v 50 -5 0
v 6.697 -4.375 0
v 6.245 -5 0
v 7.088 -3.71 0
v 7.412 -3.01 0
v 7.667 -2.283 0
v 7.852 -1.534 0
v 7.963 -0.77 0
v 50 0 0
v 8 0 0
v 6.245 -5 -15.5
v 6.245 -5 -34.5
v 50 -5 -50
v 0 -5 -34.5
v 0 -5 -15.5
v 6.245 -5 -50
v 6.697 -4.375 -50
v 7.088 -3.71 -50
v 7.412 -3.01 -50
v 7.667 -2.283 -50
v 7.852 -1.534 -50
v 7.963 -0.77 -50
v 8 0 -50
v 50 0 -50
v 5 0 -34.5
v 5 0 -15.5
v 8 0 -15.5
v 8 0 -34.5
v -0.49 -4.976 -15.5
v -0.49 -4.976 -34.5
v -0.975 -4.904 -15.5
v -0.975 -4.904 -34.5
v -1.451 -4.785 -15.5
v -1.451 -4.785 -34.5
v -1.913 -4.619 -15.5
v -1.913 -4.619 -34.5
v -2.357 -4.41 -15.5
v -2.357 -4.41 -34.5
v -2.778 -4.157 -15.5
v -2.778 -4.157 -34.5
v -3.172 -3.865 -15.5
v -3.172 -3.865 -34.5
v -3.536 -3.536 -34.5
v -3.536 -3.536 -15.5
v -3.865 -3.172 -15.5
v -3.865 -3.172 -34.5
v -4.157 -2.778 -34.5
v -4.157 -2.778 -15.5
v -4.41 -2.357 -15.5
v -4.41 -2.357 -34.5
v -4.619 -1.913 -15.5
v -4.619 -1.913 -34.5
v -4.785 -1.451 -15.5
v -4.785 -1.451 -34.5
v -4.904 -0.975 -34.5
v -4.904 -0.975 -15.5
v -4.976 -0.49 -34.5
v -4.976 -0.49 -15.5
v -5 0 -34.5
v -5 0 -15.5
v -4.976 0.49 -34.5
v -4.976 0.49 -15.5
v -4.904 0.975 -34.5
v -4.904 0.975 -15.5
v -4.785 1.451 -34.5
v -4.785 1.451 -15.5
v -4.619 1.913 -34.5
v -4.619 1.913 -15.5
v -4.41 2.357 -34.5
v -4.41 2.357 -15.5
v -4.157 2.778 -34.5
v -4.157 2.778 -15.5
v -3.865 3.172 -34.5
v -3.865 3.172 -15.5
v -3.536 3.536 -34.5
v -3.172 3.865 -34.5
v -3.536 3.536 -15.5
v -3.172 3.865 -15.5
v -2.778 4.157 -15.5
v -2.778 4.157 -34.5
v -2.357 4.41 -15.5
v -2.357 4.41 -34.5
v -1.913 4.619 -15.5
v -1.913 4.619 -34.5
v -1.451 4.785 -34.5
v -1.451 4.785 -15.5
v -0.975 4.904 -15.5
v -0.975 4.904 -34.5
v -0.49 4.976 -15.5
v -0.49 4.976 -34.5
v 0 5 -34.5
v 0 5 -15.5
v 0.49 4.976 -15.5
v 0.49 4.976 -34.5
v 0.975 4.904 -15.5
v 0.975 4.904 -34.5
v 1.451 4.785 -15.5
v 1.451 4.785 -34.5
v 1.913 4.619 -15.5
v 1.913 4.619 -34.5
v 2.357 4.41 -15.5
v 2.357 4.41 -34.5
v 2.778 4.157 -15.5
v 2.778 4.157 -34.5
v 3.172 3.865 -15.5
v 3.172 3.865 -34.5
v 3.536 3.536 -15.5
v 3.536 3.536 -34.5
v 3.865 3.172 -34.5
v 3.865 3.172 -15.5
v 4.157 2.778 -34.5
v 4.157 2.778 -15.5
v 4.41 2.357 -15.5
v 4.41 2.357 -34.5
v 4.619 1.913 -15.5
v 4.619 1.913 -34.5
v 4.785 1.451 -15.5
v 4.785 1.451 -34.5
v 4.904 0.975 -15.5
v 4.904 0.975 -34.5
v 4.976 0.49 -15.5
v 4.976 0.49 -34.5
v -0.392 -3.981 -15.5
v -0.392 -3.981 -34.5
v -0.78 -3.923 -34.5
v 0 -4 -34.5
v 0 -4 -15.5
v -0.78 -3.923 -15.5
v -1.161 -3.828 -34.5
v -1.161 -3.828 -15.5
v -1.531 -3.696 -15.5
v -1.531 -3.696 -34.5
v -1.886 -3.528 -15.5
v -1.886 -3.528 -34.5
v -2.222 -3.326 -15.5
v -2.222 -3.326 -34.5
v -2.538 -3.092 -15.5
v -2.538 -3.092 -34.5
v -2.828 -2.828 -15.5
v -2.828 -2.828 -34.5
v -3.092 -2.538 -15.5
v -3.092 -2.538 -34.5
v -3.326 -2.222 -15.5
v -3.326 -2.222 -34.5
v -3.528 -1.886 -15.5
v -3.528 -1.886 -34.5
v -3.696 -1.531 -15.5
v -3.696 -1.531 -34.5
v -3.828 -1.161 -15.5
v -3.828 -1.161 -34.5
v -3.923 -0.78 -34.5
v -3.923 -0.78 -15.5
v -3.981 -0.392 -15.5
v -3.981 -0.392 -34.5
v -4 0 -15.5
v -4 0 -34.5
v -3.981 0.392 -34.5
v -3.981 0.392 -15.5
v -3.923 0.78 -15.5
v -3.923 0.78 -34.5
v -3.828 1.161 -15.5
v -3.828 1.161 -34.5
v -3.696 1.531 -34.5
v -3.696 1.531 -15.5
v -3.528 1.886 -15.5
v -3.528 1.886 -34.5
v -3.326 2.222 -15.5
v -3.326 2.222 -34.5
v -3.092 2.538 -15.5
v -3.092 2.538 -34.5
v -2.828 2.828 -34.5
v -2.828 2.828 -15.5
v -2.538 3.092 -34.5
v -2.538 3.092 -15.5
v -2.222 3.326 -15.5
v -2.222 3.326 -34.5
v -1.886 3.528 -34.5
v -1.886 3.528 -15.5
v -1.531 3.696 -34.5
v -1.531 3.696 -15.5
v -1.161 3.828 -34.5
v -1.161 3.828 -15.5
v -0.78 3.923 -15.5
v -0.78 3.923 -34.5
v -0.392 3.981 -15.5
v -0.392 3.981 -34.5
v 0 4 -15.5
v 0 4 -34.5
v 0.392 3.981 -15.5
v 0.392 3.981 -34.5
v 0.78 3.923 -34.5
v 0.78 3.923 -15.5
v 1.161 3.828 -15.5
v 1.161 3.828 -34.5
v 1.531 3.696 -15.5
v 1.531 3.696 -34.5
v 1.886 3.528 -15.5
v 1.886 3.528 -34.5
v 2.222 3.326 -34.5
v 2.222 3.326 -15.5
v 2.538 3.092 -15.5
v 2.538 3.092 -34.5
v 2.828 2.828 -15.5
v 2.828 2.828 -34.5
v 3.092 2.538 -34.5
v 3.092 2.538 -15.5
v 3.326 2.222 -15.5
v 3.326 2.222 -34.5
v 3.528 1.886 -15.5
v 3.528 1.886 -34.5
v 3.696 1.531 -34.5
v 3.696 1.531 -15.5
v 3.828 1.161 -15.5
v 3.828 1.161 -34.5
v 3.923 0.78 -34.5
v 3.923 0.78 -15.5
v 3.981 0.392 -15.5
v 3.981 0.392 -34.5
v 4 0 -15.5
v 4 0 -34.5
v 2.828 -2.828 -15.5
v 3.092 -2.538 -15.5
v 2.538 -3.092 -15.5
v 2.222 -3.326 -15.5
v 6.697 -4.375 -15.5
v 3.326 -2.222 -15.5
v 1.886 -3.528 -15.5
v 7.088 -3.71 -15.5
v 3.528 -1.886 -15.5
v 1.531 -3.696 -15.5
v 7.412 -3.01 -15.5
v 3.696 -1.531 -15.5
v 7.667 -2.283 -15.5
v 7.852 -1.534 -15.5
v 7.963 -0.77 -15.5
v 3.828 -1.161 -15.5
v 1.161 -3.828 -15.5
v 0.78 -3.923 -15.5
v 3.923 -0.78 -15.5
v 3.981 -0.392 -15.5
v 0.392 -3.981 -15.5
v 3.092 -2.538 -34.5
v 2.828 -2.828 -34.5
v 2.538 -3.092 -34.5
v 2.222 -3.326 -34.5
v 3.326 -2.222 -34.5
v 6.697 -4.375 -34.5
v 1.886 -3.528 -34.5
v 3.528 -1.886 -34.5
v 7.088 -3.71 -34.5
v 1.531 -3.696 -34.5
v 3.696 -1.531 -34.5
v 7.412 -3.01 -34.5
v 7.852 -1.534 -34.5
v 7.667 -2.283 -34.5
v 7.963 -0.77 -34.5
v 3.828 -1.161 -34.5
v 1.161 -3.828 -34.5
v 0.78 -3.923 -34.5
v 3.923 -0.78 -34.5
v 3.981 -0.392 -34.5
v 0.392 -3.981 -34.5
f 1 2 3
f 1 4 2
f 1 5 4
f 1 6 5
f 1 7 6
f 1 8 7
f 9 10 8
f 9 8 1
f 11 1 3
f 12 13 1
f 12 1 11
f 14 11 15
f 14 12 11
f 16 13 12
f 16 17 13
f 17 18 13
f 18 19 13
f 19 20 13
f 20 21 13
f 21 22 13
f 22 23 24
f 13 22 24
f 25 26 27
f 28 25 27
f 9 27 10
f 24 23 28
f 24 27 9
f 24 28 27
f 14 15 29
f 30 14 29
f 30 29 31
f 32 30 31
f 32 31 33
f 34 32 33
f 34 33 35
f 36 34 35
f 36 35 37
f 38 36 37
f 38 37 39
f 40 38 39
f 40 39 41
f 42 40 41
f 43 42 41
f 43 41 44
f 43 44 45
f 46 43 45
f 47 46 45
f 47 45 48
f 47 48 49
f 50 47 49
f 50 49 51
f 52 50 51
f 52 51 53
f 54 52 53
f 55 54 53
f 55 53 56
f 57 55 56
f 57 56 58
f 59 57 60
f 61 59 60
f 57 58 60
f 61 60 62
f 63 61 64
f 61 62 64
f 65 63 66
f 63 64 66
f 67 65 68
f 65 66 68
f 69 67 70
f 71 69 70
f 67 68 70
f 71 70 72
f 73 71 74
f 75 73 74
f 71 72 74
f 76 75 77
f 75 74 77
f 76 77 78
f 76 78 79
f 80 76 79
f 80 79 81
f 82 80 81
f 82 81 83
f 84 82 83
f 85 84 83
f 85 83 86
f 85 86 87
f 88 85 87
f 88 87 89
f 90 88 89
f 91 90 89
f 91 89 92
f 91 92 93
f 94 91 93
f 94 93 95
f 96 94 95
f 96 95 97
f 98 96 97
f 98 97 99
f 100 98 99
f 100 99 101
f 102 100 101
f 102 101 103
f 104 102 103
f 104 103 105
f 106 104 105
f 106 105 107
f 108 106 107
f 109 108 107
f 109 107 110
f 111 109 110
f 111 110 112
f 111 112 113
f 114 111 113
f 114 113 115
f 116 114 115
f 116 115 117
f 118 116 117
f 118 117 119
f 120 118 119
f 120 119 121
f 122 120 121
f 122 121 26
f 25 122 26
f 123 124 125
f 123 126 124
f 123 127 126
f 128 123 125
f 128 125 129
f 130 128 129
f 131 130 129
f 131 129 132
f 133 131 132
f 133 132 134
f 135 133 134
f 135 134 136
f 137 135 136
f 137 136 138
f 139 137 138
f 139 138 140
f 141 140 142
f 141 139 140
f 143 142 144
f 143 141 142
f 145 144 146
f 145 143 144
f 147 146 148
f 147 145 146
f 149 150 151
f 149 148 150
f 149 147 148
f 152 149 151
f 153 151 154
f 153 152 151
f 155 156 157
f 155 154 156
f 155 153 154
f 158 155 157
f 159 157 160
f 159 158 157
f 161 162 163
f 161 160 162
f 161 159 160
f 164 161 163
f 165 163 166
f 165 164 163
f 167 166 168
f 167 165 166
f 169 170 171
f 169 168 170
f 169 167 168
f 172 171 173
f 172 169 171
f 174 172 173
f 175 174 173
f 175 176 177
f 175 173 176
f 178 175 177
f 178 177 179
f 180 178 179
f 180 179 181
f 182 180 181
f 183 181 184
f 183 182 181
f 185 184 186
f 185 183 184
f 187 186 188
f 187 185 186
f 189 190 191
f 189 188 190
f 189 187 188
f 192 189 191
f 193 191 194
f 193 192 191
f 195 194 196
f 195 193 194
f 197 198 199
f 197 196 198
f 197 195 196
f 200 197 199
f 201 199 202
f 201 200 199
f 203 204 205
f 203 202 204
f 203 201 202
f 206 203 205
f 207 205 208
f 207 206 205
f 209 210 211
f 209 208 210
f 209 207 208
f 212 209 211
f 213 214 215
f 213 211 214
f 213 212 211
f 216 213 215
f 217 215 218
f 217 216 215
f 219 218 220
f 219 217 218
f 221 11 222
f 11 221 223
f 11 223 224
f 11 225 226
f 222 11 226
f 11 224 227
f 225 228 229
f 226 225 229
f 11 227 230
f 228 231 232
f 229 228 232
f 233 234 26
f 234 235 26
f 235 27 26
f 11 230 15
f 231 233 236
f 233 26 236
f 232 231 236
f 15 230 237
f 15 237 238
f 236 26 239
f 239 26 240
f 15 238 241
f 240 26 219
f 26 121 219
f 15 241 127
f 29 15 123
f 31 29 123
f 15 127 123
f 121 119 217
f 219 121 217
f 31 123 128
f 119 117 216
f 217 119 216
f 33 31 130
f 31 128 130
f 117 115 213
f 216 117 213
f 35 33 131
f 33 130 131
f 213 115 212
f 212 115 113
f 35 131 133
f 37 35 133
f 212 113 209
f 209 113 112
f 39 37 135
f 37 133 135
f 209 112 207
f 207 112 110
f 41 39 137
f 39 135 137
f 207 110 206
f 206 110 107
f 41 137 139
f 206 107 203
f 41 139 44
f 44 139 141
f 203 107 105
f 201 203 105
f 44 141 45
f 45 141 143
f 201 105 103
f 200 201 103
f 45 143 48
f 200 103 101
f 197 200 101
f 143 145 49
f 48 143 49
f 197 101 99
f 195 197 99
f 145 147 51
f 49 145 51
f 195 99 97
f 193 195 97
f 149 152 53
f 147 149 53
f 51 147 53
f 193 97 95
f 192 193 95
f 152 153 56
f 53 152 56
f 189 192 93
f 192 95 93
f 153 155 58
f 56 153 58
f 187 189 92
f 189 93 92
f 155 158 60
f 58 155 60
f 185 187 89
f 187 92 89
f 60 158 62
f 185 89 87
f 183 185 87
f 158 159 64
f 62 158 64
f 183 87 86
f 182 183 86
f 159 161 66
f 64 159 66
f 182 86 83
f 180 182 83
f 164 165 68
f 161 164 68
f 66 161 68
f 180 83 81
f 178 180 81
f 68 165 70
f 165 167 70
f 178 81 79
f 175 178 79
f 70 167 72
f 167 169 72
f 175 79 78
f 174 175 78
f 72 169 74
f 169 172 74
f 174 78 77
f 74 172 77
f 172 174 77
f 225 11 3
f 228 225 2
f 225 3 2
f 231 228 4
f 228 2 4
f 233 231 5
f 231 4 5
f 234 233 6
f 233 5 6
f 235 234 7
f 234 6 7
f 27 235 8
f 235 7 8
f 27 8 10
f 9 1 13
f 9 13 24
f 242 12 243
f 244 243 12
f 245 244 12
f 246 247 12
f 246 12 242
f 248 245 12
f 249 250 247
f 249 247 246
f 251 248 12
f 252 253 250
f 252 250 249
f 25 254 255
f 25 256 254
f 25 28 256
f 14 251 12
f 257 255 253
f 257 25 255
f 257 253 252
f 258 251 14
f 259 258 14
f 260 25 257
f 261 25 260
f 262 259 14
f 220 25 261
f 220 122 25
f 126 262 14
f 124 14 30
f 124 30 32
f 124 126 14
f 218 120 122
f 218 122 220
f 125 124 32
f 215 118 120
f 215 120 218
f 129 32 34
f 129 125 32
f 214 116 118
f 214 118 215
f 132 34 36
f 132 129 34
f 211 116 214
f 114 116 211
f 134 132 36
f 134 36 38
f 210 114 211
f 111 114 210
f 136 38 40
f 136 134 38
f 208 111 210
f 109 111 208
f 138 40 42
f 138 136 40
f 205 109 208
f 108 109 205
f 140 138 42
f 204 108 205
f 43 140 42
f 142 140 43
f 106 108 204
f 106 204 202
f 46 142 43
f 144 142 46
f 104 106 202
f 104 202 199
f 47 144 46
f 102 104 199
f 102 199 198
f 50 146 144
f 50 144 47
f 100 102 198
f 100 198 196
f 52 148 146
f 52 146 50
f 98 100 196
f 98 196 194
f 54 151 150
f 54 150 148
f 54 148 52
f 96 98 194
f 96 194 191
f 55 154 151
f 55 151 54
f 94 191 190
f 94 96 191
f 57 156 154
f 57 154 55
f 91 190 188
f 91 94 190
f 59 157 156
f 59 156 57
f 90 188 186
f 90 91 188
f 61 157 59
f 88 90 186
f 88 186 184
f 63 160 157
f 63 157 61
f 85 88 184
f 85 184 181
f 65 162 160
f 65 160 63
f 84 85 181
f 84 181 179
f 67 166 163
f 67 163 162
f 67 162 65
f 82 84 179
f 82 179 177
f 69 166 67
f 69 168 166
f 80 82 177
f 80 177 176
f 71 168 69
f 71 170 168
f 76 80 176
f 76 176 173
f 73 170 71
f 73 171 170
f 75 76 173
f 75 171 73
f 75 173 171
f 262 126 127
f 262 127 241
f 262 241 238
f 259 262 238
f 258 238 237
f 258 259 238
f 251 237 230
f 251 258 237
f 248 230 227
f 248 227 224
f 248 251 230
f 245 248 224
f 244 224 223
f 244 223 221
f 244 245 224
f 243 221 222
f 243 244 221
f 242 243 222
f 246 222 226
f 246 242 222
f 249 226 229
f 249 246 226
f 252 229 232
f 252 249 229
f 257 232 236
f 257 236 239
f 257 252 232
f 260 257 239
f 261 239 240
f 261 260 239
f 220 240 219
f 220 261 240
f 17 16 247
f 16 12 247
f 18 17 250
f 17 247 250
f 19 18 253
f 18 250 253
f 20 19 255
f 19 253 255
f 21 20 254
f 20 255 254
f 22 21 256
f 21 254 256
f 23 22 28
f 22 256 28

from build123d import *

# Parameters (mm, degrees)
SKETCH1_W           = 50
SKETCH1_H           = 5
BOSS_EXTRUDE1_DEPTH = 50
SKETCH2_R           = 8
CUT_EXTRUDE1_DEPTH  = 50
SKETCH3_R           = 5
SKETCH3_R_2         = 4
BOSS_EXTRUDE2_DEPTH = 19
BOSS_EXTRUDE4_DEPTH = 19


with BuildPart() as part:
    # Sketch1 → Boss-Extrude1 (new body)
    with BuildSketch(Plane.XY):
        with Locations((25, -2.5)):
            Rectangle(SKETCH1_W, SKETCH1_H)
    extrude(amount=-BOSS_EXTRUDE1_DEPTH)

    # Sketch2 → Cut-Extrude1 (cut)
    with BuildSketch(Plane.XY):
        Circle(SKETCH2_R)
    extrude(amount=-CUT_EXTRUDE1_DEPTH, mode=Mode.SUBTRACT)



with BuildPart() as body_2:
    # Sketch3 → Boss-Extrude2 (new body)
    with BuildSketch(Plane(origin=(0, 0, -15.5), x_dir=(-1, 0, 0), z_dir=(0, 0, -1))):
        Circle(SKETCH3_R)
        Circle(SKETCH3_R_2, mode=Mode.SUBTRACT)
    extrude(amount=BOSS_EXTRUDE2_DEPTH)


with BuildPart() as part_1:
    add(part.part)

    add(body_2.part)  # Boss-Extrude4 merges body 2
    # Sketch8 → Boss-Extrude4 (add)
    with BuildSketch(Plane(origin=(0, 0, -34.5), x_dir=(-1, 0, 0), z_dir=(0, 0, -1))):
        with BuildLine():
            Line((-4, 0), (-10, 0))
            Line((-10, 0), (-10, -5))
            Line((-10, -5), (0, -5))
            Line((0, -5), (0, -4))
            ThreePointArc((0, -4), (-2.828427125, -2.828427125), (-4, 0))
        make_face()
    extrude(amount=-BOSS_EXTRUDE4_DEPTH)


solid = part_1.part
